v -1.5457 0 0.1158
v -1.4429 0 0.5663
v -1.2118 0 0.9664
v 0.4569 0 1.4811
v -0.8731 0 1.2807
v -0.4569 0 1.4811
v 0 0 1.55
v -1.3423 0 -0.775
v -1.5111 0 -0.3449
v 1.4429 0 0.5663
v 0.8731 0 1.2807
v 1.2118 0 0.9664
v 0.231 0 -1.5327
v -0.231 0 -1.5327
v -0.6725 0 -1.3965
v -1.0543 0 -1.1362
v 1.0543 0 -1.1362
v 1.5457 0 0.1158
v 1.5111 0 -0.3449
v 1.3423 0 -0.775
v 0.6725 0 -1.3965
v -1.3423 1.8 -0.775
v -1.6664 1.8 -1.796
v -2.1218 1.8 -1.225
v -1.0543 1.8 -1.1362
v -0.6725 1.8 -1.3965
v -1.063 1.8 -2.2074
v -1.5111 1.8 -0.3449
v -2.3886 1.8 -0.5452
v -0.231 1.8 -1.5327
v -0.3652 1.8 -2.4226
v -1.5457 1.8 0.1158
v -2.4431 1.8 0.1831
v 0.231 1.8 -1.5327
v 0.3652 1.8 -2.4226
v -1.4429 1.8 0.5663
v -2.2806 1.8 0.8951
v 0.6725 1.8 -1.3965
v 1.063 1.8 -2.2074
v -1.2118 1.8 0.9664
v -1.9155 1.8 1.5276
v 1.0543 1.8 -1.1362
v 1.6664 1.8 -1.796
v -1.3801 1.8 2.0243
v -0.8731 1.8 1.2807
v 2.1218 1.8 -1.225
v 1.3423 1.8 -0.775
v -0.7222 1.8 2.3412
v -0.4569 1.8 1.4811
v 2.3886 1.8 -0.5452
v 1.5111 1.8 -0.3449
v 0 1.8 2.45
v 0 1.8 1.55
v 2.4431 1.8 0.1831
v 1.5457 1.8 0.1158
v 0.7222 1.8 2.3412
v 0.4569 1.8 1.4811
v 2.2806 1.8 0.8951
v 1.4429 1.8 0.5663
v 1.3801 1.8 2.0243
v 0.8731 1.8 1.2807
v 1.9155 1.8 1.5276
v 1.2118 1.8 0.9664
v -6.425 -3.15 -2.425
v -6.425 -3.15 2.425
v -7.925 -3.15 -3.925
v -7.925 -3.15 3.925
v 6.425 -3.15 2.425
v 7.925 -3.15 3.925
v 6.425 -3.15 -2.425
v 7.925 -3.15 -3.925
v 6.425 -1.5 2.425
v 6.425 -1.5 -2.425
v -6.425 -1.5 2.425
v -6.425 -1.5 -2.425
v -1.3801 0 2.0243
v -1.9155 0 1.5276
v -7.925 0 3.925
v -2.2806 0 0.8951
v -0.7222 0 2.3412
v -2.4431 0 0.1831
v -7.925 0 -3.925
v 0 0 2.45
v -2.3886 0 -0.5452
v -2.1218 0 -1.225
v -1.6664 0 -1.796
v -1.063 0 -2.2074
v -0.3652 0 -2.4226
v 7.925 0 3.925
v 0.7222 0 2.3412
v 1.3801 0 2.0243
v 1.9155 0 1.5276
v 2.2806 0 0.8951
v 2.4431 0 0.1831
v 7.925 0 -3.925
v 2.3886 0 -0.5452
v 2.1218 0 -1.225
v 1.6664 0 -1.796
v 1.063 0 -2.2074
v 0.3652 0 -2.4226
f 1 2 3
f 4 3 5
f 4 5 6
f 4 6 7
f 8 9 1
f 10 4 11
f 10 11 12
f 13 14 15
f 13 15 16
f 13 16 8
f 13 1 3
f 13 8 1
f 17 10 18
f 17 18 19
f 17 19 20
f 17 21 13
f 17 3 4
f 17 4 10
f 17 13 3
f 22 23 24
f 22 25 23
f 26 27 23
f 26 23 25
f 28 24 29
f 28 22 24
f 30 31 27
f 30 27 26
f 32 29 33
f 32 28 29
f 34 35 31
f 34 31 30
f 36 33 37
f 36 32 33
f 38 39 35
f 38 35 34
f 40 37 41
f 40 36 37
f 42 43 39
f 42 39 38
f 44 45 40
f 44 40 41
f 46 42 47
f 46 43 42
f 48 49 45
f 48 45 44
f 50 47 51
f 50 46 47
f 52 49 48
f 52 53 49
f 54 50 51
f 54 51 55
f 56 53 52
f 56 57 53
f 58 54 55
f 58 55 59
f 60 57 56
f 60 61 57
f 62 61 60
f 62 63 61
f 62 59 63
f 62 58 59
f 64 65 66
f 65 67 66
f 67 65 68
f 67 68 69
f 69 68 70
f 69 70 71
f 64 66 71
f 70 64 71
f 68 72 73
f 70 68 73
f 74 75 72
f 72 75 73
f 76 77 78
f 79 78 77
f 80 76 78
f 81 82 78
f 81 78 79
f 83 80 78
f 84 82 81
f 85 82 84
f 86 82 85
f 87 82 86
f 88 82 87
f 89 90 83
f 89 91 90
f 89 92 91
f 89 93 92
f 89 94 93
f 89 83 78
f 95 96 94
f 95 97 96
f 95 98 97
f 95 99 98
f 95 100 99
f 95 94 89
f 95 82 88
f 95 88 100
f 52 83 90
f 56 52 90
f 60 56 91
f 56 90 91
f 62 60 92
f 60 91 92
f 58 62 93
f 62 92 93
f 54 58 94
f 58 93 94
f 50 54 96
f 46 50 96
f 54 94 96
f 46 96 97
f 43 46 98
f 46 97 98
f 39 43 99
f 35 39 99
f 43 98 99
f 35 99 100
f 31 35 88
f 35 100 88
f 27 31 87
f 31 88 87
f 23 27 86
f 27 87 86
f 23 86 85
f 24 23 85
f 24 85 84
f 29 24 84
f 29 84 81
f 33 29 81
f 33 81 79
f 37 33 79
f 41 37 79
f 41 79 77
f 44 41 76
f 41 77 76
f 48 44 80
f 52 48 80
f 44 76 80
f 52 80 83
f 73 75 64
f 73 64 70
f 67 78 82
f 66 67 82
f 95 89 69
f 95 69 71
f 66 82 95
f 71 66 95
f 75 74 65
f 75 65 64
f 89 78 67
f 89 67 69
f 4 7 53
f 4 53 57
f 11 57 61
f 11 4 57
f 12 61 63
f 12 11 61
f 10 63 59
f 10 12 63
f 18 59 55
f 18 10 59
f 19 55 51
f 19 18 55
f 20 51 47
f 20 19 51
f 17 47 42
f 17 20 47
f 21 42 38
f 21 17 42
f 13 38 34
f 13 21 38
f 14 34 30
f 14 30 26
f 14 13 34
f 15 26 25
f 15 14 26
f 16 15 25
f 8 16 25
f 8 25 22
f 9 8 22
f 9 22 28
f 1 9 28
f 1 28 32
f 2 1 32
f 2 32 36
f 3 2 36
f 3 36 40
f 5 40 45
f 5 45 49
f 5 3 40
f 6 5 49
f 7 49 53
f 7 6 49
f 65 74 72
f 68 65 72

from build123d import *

# Parameters (mm, degrees)
SKETCH1_W           = 15.85
SKETCH1_H           = 7.85
BOSS_EXTRUDE1_DEPTH = 3.15
SHELL1_T            = -1.5
SKETCH2_R           = 2.45
SKETCH2_R_2         = 1.55
BOSS_EXTRUDE2_DEPTH = 1.8


with BuildPart() as part:
    # Sketch1 → Boss-Extrude1 (new body)
    with BuildSketch(Plane(origin=(0, 0, 0), x_dir=(1, 0, 0), z_dir=(0, 1, 0))):
        Rectangle(SKETCH1_W, SKETCH1_H)
    extrude(amount=-BOSS_EXTRUDE1_DEPTH)

    # Shell1
    shell1_openings = [part.faces().sort_by_distance(p)[0] for p in [
        (0, -3.15, 0),
    ]]
    offset(amount=SHELL1_T, openings=shell1_openings, kind=Kind.INTERSECTION)

    # Sketch2 → Boss-Extrude2 (add)
    with BuildSketch(Plane(origin=(0, 0, 0), x_dir=(1, 0, 0), z_dir=(0, 1, 0))):
        with Locations(Location((0, 0, 0), (0, 0, 270))):
            Circle(SKETCH2_R)
        with Locations(Location((0, 0, 0), (0, 0, 270))):
            Circle(SKETCH2_R_2, mode=Mode.SUBTRACT)
    extrude(amount=BOSS_EXTRUDE2_DEPTH)


solid = part.part
